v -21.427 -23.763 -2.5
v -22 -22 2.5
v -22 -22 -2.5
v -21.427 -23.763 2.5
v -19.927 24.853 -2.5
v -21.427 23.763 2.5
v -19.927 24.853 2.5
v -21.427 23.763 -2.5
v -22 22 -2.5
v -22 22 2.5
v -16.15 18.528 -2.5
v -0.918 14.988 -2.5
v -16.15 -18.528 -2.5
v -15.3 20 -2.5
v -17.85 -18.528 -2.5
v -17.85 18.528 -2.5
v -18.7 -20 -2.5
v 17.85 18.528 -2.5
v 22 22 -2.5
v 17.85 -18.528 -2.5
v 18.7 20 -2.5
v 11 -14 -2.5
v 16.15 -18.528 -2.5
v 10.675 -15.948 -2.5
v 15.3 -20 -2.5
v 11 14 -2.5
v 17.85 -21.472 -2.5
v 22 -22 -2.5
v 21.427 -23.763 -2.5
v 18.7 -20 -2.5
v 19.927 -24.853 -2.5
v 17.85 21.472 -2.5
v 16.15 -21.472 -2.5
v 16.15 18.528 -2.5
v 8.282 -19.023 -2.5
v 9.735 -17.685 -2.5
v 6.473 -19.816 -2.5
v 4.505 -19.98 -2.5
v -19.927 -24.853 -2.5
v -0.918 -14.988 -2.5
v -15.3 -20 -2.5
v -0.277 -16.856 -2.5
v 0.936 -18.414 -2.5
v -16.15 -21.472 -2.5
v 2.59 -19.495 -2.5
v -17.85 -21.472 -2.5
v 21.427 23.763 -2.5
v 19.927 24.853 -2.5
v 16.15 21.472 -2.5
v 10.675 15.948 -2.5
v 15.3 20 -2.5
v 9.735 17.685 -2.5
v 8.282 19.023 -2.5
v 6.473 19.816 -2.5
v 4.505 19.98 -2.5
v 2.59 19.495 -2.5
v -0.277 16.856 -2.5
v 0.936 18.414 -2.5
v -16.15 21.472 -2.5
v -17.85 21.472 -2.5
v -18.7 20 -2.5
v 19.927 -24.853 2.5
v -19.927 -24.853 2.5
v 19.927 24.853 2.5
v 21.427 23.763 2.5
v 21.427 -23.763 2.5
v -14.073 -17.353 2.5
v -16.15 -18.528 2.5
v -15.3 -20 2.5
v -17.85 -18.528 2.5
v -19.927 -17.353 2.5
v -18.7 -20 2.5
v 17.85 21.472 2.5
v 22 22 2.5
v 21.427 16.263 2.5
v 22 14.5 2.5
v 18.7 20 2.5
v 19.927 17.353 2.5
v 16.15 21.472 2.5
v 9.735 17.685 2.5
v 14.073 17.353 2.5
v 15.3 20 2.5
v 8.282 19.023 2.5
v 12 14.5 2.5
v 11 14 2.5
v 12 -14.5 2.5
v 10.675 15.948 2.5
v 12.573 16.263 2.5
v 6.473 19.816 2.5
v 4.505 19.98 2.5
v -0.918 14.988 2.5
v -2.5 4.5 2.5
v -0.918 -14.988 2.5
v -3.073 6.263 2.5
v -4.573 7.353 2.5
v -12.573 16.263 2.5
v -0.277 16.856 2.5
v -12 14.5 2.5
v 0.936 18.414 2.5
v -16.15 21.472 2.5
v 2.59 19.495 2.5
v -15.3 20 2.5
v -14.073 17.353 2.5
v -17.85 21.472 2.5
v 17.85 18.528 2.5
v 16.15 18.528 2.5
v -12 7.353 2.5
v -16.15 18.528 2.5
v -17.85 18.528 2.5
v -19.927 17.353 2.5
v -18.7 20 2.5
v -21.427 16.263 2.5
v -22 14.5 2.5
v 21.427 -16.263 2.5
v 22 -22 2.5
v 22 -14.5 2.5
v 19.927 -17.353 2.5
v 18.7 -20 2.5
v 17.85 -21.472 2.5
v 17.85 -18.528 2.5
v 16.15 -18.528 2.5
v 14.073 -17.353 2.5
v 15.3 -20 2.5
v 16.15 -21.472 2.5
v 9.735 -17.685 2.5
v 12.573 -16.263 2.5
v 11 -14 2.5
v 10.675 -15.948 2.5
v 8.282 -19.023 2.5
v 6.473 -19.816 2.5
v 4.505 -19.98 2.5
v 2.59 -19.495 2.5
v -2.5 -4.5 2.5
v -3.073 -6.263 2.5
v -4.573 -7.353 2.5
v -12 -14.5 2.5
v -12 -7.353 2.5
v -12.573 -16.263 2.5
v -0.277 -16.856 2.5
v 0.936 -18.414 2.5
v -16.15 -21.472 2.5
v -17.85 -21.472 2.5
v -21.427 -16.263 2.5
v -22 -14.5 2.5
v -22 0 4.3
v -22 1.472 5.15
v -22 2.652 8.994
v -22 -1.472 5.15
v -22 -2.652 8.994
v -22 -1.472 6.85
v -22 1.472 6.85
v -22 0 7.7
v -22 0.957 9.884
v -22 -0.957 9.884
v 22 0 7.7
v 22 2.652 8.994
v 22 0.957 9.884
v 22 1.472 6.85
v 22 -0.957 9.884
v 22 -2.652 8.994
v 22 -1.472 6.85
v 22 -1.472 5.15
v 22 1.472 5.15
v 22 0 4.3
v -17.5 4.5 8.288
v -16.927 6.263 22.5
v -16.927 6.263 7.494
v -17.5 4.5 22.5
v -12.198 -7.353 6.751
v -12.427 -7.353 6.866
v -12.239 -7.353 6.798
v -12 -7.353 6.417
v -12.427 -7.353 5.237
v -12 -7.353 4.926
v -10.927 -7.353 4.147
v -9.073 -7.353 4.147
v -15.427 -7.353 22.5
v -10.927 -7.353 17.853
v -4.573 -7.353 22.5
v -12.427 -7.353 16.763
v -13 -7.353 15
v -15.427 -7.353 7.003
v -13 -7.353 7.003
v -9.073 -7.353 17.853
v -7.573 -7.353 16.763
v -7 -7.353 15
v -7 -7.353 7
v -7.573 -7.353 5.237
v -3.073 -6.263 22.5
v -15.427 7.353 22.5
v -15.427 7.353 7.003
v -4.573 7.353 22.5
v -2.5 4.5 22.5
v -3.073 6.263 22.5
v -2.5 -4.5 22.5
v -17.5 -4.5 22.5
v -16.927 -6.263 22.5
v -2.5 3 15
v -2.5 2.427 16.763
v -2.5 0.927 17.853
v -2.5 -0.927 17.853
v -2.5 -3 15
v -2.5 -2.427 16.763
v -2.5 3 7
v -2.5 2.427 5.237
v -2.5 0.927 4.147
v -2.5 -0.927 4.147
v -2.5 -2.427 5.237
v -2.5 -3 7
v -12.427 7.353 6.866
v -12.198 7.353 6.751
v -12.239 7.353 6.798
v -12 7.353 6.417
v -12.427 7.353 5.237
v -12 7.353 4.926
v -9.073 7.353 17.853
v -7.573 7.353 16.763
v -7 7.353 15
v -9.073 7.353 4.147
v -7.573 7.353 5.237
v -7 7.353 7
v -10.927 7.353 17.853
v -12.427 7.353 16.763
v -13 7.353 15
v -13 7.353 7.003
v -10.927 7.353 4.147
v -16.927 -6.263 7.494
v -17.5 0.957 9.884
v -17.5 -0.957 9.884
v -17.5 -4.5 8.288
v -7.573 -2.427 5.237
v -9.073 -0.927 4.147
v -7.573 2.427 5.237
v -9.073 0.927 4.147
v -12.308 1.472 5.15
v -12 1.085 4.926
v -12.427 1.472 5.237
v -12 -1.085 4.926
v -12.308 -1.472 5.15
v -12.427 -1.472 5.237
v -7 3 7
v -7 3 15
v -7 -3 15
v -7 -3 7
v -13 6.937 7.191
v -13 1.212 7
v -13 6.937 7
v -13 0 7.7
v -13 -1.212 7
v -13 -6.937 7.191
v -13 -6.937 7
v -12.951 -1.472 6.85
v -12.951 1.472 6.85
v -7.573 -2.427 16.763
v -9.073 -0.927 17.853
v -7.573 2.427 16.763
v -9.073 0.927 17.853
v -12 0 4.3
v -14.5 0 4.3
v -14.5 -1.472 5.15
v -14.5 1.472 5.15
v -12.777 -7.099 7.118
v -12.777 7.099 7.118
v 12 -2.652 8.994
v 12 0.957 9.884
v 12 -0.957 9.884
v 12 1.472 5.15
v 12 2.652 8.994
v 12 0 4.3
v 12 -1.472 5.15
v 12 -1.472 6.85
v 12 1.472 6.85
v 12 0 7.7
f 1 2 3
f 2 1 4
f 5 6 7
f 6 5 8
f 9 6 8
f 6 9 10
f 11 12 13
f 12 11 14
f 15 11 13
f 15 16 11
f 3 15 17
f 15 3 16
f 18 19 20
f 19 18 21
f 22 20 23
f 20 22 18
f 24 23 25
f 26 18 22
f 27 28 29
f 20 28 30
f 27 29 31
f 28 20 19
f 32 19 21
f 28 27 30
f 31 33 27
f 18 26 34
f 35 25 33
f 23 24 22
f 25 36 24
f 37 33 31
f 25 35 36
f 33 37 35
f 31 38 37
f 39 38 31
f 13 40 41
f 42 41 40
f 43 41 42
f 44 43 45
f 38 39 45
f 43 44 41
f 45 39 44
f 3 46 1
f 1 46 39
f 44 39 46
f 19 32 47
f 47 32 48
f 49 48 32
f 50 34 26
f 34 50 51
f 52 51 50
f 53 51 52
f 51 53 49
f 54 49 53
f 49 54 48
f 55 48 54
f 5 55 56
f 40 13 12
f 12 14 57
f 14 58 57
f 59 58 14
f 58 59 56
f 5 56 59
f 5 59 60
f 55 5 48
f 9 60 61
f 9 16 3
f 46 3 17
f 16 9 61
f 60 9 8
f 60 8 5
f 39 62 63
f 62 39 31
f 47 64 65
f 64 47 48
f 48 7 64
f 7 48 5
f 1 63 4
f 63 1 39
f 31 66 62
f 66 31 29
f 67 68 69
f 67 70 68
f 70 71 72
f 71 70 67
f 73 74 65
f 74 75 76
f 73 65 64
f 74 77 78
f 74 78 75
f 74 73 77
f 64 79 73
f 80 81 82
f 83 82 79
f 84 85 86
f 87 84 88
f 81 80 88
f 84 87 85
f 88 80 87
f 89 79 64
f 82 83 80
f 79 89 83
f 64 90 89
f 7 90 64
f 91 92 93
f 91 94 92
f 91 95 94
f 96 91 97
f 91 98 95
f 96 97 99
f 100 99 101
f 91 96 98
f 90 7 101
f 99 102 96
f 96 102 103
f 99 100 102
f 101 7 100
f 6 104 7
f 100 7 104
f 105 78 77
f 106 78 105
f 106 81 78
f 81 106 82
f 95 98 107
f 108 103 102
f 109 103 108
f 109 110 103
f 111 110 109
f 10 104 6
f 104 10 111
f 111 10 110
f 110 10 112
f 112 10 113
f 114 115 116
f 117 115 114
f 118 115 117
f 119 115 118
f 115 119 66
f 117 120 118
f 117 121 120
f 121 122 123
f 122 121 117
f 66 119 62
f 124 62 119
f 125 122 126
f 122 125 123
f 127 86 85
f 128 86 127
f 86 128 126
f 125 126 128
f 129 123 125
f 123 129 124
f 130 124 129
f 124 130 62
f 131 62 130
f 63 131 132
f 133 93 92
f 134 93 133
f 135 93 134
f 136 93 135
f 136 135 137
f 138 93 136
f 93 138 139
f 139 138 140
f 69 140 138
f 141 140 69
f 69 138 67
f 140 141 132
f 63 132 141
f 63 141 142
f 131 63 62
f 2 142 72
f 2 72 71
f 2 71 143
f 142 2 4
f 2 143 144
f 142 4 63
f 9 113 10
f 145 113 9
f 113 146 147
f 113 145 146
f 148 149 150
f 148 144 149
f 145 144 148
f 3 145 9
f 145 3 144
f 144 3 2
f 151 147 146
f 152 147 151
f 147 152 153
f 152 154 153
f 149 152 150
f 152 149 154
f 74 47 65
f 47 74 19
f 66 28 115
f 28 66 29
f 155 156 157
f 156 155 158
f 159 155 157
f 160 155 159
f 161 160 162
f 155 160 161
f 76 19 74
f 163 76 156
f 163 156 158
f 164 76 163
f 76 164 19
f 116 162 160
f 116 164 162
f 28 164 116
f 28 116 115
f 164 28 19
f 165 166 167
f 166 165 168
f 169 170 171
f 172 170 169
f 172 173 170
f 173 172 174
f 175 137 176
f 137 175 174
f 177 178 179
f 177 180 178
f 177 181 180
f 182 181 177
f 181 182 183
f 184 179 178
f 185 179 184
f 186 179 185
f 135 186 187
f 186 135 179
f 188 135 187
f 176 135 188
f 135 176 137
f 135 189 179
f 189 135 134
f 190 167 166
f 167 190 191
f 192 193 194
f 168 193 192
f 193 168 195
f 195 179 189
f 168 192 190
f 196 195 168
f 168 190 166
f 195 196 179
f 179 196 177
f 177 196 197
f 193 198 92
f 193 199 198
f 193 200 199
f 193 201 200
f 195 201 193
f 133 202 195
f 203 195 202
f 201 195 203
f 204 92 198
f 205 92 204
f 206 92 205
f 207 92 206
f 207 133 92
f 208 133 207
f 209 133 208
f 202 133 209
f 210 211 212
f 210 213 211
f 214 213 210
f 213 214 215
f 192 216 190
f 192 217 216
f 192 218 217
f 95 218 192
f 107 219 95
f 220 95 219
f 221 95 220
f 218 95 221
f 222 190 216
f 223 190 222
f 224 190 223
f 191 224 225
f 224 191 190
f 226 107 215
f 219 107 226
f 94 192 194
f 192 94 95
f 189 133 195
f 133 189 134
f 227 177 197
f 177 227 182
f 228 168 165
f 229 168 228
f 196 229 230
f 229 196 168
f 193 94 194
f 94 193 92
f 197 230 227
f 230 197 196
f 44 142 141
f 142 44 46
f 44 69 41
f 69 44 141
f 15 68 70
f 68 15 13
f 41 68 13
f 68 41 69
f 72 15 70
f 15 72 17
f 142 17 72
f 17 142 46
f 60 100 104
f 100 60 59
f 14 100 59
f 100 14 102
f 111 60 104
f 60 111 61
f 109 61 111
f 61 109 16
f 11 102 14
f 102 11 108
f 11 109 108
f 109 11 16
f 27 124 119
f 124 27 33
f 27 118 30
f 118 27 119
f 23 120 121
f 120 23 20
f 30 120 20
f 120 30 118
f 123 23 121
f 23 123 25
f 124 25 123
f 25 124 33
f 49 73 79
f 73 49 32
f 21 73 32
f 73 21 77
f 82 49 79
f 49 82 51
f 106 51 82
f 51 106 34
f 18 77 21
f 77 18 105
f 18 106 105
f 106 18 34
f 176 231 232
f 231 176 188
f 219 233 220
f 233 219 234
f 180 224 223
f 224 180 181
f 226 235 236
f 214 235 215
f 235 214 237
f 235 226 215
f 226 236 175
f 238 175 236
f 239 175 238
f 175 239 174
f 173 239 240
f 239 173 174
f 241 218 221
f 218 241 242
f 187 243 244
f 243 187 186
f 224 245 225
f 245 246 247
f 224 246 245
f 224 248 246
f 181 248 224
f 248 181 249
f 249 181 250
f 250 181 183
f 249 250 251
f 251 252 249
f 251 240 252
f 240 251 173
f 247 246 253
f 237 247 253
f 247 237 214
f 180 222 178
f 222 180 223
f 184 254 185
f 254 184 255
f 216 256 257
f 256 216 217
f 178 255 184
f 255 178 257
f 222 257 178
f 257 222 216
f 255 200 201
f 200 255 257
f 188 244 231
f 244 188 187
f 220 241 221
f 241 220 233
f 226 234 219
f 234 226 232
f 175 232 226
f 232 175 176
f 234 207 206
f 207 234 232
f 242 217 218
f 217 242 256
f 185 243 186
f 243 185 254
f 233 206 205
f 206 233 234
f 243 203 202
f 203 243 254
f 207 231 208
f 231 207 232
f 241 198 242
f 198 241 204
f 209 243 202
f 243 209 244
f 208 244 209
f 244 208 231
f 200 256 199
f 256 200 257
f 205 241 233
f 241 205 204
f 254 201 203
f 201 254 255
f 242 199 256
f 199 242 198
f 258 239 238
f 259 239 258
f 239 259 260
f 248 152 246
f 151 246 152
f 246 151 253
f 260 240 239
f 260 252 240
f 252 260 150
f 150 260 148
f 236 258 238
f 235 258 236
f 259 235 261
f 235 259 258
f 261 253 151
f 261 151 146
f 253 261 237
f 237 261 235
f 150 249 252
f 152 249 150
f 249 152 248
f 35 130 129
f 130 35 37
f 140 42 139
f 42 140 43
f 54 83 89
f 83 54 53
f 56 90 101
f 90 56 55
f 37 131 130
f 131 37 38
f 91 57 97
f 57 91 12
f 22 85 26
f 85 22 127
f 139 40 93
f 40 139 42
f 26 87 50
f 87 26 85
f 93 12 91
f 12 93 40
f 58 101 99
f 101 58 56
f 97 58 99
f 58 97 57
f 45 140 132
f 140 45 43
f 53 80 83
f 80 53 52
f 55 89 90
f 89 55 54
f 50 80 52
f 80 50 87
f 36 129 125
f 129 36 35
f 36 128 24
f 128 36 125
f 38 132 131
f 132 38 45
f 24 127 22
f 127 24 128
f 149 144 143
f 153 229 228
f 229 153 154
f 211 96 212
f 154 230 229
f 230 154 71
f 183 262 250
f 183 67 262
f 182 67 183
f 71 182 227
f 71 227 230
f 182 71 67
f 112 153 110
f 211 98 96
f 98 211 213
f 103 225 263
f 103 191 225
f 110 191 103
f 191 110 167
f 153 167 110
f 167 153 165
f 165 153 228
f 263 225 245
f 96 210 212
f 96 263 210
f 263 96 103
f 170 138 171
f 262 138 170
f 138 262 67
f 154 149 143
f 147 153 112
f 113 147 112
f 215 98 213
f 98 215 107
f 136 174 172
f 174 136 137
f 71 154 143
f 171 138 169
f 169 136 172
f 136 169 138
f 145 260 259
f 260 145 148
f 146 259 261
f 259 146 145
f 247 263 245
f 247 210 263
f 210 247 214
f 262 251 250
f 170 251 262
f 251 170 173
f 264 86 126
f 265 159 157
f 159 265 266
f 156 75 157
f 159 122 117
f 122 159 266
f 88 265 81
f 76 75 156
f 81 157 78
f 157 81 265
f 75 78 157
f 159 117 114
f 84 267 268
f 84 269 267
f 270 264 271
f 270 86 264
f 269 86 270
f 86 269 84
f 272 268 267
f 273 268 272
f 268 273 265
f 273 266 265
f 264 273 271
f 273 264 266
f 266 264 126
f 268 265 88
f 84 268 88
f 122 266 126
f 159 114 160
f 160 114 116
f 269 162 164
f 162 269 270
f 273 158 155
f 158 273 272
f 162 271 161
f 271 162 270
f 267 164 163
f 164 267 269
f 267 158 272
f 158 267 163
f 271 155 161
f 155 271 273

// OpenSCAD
h=40;
w=34;
difference() {
    union() {
        roundcube([w+10, h+10, 5], center=true);
        translate([-10,0,0])
            translate([0,0,10])roundcube([15,15,25], center=true);
    }
    #for (i = [-1, 1]) {
        for (j = [-1, 1]) {
            translate([i*w/2, j*h/2,0])
                cylinder(d=3.4, h=10,center=true);
        }
    }
    translate([-10,0,0]) {
        translate([0,0,7])
        {
            #hull() {
                rotate([90,0,0])cylinder(r=3, h=40, center=true);
                translate([0,0,8])rotate([90,0,0])cylinder(r=3, h=40, center=true);
            }
            translate([10,0,0])
                #hull() {
                    rotate([90,0,90])cylinder(r=3, h=20, center=true);
                    translate([0,0,8])rotate([90,0,90])cylinder(r=3, h=20, center=true);
                }
        }
    }
    translate([5,0,0])
    hull() { 
        for (i = [-1, 1])
        translate([0,i*(h-6-6)/2,0])
            cylinder(r=6, h=5,center=true);
    }
    for (i = [-1, 1]) {
        translate([i*w/2,0,6]) 
        {
            rotate([0,90,0])cylinder(d=3.4, h=10,center=true);
        }
    }
}
for (i = [-1, 1]) {
    translate([i*w/2,0,6]) 
    {
        difference() {
            hull () {
                rotate([0,90,0])cylinder(r=4, h=10,center=true);
                translate([0,0,-6])roundcube([10,h-5,5], center=true);
            }
            rotate([0,90,0])cylinder(d=3.4, h=10,center=true);
            if (i == -1) translate([10,0,0]) translate([0,0,10])roundcube([15,15,25], center=true);
        }
    }
}
use<inc/functions.scad>
